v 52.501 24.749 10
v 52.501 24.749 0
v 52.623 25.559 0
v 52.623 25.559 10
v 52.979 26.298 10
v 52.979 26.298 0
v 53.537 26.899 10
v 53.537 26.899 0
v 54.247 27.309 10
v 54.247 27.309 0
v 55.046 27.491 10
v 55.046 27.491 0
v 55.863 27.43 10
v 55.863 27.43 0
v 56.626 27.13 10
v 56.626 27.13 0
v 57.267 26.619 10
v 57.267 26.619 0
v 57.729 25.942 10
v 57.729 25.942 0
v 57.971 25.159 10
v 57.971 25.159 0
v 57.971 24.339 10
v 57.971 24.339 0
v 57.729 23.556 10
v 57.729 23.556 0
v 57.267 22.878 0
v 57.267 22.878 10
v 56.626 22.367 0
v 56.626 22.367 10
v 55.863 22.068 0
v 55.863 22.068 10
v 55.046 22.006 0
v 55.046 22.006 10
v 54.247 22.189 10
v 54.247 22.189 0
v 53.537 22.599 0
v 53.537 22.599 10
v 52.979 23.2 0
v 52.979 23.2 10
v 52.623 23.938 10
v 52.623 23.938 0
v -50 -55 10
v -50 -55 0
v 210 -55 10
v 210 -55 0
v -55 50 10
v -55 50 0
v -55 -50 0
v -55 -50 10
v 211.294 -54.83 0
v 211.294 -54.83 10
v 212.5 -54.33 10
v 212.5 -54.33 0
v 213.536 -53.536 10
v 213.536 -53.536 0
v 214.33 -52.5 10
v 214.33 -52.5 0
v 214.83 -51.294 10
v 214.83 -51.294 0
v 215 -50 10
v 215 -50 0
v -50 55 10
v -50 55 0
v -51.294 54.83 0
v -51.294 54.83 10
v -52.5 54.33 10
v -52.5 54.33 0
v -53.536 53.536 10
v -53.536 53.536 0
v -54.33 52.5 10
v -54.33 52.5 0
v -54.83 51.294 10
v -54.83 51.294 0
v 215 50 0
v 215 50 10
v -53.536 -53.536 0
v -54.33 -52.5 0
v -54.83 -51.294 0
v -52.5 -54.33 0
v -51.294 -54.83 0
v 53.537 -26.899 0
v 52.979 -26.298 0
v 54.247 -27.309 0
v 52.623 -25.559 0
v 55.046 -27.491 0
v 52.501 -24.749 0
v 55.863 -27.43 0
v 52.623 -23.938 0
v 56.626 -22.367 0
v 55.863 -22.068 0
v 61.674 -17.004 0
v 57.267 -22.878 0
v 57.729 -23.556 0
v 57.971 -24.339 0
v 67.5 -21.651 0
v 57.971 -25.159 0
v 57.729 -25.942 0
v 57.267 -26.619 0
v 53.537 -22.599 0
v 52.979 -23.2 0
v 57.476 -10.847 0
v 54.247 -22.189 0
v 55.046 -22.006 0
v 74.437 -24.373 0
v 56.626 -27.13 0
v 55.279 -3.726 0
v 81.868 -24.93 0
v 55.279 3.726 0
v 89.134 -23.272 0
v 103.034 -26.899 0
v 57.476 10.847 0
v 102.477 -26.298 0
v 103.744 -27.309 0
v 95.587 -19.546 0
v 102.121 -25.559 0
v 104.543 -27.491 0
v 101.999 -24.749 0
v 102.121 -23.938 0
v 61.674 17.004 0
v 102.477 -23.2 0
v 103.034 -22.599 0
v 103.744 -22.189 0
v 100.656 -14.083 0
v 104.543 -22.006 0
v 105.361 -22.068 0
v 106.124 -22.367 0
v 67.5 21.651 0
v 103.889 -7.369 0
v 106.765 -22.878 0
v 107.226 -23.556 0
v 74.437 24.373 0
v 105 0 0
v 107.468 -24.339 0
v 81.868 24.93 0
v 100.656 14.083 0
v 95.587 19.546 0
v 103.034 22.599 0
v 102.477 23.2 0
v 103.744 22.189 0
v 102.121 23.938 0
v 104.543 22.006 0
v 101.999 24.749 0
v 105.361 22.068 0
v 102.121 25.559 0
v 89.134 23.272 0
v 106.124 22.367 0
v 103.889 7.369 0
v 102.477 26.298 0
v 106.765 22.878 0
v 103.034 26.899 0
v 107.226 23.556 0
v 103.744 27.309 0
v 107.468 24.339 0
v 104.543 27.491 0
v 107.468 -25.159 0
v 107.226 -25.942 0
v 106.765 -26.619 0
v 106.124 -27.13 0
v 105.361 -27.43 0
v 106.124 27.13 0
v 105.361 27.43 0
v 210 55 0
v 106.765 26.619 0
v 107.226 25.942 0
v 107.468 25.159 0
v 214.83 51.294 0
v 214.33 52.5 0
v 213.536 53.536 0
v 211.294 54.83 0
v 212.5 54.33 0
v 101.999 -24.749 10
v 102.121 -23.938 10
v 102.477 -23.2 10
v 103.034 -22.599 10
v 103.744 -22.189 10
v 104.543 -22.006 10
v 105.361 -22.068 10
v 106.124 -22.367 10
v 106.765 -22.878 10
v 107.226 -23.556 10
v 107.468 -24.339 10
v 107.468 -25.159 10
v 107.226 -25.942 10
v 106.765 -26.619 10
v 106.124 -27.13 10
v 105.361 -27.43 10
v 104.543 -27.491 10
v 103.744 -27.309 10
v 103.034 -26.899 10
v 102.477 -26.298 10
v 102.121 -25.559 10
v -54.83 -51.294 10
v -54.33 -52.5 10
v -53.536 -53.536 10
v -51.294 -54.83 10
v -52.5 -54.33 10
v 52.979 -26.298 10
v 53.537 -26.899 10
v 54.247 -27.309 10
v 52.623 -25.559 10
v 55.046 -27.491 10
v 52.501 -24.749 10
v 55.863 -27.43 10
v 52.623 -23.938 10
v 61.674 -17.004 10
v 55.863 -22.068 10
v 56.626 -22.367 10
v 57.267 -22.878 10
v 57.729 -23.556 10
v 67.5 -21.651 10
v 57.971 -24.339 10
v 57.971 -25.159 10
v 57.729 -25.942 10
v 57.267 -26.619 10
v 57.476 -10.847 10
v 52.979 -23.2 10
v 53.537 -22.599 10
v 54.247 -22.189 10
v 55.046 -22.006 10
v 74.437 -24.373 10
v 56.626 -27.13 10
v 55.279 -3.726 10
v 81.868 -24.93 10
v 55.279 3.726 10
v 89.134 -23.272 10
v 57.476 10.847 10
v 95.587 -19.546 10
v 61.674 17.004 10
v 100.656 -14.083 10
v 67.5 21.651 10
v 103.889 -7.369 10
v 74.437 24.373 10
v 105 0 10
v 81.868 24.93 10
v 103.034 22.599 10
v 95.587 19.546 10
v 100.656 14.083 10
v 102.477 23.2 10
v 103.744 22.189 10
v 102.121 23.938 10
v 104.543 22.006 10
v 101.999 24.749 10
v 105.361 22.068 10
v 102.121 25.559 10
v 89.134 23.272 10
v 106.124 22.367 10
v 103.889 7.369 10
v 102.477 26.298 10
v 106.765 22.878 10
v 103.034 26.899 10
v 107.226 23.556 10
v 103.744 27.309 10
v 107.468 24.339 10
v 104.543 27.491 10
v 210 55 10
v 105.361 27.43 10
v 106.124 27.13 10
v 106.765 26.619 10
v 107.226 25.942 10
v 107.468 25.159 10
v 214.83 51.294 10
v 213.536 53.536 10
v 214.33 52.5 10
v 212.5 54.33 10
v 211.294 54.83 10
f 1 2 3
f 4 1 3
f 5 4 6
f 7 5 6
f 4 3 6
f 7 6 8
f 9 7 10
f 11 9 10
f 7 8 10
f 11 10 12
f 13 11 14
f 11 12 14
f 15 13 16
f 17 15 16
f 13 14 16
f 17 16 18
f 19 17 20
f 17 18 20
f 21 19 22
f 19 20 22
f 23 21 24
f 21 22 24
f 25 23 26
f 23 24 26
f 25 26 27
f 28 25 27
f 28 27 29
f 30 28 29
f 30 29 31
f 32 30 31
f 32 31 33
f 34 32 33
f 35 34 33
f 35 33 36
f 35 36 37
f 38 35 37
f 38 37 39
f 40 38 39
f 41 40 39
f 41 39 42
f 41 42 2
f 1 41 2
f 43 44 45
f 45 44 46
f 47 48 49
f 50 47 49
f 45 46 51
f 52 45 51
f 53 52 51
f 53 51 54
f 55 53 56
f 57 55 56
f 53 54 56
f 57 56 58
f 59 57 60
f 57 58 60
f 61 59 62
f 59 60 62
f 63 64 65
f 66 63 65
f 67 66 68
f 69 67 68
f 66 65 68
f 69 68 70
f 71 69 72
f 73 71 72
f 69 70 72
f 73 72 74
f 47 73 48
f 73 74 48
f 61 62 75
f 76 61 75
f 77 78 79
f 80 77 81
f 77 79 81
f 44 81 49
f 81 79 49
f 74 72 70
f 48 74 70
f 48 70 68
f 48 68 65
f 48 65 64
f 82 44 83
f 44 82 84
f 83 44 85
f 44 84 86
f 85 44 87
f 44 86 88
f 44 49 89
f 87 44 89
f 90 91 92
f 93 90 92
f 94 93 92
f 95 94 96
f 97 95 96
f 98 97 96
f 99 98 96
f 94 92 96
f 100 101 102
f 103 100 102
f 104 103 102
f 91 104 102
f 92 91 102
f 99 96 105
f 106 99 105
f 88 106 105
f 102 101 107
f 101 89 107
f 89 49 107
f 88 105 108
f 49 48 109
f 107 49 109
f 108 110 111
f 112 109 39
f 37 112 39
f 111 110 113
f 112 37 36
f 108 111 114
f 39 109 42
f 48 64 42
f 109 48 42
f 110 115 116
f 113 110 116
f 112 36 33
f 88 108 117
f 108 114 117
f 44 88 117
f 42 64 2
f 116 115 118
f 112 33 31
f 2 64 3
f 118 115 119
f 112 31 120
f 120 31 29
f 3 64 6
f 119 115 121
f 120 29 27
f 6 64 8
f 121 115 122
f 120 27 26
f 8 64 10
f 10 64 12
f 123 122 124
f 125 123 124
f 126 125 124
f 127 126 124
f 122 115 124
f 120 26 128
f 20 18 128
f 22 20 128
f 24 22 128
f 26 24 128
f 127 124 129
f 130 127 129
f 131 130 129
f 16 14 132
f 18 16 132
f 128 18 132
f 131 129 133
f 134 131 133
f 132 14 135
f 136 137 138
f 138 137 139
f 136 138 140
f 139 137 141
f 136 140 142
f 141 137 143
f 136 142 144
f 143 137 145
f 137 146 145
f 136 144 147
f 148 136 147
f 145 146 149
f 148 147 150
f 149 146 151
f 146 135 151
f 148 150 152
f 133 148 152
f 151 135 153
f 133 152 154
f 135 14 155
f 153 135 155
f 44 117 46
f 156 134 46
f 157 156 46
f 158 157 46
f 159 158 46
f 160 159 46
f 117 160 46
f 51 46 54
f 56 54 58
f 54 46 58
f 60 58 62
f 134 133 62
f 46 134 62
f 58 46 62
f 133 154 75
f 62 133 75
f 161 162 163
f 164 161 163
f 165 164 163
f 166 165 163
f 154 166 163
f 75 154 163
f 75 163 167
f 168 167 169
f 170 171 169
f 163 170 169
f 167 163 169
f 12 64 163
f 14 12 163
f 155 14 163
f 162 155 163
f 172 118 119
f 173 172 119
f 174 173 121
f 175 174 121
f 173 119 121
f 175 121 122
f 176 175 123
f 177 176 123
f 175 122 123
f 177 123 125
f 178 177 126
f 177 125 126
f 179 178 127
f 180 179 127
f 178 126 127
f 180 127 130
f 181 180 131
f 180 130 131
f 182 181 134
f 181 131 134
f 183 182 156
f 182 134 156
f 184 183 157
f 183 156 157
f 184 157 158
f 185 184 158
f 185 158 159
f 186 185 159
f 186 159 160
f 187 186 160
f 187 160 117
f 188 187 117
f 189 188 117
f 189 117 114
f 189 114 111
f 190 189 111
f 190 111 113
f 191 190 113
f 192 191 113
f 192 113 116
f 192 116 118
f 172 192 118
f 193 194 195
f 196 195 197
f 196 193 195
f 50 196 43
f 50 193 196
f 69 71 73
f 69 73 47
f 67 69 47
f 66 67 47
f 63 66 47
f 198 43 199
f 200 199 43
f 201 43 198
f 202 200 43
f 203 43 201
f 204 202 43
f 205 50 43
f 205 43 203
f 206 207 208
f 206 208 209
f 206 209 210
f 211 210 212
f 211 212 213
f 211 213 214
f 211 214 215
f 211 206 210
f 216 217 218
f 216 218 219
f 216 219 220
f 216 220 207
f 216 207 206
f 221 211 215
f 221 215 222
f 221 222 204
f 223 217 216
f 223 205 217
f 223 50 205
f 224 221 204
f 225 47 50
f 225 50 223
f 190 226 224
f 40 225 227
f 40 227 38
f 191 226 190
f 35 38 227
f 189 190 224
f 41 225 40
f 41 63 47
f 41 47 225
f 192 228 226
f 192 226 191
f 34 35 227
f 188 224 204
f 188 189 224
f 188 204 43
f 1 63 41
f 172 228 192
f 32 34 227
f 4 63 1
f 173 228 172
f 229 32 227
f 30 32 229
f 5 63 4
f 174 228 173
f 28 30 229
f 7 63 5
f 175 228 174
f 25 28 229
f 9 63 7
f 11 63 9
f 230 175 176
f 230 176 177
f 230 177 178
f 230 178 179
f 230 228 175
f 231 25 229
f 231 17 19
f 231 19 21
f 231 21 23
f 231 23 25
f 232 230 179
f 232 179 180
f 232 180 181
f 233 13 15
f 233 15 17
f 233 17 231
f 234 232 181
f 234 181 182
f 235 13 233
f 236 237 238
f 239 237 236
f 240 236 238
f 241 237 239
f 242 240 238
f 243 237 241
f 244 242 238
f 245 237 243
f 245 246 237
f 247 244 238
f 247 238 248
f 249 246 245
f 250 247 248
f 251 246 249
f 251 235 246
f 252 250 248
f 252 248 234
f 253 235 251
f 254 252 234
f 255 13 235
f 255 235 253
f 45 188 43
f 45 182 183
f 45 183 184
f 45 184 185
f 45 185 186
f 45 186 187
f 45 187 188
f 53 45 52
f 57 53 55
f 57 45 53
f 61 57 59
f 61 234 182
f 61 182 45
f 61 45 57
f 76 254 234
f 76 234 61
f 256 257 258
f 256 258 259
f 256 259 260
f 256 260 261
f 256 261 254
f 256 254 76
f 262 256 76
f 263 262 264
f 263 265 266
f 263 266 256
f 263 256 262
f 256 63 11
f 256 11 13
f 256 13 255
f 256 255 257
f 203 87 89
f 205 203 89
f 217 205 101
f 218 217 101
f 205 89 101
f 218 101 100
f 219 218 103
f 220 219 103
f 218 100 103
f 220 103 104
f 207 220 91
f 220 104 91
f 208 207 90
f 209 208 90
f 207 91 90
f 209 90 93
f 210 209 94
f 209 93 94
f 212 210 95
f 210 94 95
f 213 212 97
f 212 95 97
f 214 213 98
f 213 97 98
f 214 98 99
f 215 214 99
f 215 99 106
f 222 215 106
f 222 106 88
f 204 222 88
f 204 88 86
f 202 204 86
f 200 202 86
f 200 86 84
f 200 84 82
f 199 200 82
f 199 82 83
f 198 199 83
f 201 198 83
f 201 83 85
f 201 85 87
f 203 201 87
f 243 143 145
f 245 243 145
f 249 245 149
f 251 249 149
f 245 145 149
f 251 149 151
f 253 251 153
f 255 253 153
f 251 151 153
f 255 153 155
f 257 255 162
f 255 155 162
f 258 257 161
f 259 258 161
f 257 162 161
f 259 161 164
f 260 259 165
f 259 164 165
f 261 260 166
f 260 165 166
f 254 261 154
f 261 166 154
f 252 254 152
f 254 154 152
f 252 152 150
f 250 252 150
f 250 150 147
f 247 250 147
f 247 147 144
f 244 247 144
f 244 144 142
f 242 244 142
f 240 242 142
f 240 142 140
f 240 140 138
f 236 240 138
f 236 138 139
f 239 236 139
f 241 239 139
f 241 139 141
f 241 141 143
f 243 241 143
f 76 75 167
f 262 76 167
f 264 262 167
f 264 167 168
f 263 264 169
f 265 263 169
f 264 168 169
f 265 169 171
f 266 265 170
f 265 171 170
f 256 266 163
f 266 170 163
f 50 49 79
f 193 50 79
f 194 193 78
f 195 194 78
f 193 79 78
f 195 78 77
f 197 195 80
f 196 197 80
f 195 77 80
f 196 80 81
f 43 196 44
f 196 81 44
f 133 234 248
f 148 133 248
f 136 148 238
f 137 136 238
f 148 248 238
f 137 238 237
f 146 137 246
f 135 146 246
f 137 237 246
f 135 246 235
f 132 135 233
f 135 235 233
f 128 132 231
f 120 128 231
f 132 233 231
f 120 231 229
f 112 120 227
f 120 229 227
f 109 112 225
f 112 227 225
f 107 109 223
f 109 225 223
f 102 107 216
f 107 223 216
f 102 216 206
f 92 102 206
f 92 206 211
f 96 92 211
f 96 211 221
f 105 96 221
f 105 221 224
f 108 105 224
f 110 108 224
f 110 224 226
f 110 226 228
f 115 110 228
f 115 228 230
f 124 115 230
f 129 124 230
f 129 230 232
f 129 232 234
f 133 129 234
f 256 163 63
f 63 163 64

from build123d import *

# Parameters (mm, degrees)
BOSS_EXTRUDE1_DEPTH  = 10
SKETCH2_R            = 25
CUT_EXTRUDE1_DEPTH   = 776.358804999
M5_CLEARANCE_HOLE1_D = 5.5


with BuildPart() as part:
    # Sketch1 → Boss-Extrude1 (new body)
    with BuildSketch(Plane.XY):
        with BuildLine():
            Line((-55, 50), (-55, -50))
            ThreePointArc((-55, -50), (-53.535533906, -53.535533906), (-50, -55))
            Line((-50, -55), (210, -55))
            ThreePointArc((210, -55), (213.535533906, -53.535533906), (215, -50))
            Line((215, -50), (215, 50))
            ThreePointArc((215, 50), (213.535533906, 53.535533906), (210, 55))
            Line((210, 55), (-50, 55))
            ThreePointArc((-50, 55), (-53.535533906, 53.535533906), (-55, 50))
        make_face()
    extrude(amount=BOSS_EXTRUDE1_DEPTH)

    # Sketch2 → Cut-Extrude1 (cut, through all)
    with BuildSketch(Plane(origin=(-479.845790405, 288.904934605, 10), x_dir=(1, 0, 0), z_dir=(0, 0, 1))):
        with Locations((559.845790405, -288.904934605)):
            Circle(SKETCH2_R)
    extrude(amount=-CUT_EXTRUDE1_DEPTH, mode=Mode.SUBTRACT)

    # M5 Clearance Hole1 (through all)
    with Locations(Plane(origin=(-479.845790405, 288.904934605, 10), x_dir=(1, 0, 0), z_dir=(0, 0, 1))):
        with Locations((535.097053063, -264.156197264), (584.594527746, -264.156197264), (584.594527746, -313.653671947), (535.097053063, -313.653671947)):
            Hole(M5_CLEARANCE_HOLE1_D / 2)


solid = part.part
